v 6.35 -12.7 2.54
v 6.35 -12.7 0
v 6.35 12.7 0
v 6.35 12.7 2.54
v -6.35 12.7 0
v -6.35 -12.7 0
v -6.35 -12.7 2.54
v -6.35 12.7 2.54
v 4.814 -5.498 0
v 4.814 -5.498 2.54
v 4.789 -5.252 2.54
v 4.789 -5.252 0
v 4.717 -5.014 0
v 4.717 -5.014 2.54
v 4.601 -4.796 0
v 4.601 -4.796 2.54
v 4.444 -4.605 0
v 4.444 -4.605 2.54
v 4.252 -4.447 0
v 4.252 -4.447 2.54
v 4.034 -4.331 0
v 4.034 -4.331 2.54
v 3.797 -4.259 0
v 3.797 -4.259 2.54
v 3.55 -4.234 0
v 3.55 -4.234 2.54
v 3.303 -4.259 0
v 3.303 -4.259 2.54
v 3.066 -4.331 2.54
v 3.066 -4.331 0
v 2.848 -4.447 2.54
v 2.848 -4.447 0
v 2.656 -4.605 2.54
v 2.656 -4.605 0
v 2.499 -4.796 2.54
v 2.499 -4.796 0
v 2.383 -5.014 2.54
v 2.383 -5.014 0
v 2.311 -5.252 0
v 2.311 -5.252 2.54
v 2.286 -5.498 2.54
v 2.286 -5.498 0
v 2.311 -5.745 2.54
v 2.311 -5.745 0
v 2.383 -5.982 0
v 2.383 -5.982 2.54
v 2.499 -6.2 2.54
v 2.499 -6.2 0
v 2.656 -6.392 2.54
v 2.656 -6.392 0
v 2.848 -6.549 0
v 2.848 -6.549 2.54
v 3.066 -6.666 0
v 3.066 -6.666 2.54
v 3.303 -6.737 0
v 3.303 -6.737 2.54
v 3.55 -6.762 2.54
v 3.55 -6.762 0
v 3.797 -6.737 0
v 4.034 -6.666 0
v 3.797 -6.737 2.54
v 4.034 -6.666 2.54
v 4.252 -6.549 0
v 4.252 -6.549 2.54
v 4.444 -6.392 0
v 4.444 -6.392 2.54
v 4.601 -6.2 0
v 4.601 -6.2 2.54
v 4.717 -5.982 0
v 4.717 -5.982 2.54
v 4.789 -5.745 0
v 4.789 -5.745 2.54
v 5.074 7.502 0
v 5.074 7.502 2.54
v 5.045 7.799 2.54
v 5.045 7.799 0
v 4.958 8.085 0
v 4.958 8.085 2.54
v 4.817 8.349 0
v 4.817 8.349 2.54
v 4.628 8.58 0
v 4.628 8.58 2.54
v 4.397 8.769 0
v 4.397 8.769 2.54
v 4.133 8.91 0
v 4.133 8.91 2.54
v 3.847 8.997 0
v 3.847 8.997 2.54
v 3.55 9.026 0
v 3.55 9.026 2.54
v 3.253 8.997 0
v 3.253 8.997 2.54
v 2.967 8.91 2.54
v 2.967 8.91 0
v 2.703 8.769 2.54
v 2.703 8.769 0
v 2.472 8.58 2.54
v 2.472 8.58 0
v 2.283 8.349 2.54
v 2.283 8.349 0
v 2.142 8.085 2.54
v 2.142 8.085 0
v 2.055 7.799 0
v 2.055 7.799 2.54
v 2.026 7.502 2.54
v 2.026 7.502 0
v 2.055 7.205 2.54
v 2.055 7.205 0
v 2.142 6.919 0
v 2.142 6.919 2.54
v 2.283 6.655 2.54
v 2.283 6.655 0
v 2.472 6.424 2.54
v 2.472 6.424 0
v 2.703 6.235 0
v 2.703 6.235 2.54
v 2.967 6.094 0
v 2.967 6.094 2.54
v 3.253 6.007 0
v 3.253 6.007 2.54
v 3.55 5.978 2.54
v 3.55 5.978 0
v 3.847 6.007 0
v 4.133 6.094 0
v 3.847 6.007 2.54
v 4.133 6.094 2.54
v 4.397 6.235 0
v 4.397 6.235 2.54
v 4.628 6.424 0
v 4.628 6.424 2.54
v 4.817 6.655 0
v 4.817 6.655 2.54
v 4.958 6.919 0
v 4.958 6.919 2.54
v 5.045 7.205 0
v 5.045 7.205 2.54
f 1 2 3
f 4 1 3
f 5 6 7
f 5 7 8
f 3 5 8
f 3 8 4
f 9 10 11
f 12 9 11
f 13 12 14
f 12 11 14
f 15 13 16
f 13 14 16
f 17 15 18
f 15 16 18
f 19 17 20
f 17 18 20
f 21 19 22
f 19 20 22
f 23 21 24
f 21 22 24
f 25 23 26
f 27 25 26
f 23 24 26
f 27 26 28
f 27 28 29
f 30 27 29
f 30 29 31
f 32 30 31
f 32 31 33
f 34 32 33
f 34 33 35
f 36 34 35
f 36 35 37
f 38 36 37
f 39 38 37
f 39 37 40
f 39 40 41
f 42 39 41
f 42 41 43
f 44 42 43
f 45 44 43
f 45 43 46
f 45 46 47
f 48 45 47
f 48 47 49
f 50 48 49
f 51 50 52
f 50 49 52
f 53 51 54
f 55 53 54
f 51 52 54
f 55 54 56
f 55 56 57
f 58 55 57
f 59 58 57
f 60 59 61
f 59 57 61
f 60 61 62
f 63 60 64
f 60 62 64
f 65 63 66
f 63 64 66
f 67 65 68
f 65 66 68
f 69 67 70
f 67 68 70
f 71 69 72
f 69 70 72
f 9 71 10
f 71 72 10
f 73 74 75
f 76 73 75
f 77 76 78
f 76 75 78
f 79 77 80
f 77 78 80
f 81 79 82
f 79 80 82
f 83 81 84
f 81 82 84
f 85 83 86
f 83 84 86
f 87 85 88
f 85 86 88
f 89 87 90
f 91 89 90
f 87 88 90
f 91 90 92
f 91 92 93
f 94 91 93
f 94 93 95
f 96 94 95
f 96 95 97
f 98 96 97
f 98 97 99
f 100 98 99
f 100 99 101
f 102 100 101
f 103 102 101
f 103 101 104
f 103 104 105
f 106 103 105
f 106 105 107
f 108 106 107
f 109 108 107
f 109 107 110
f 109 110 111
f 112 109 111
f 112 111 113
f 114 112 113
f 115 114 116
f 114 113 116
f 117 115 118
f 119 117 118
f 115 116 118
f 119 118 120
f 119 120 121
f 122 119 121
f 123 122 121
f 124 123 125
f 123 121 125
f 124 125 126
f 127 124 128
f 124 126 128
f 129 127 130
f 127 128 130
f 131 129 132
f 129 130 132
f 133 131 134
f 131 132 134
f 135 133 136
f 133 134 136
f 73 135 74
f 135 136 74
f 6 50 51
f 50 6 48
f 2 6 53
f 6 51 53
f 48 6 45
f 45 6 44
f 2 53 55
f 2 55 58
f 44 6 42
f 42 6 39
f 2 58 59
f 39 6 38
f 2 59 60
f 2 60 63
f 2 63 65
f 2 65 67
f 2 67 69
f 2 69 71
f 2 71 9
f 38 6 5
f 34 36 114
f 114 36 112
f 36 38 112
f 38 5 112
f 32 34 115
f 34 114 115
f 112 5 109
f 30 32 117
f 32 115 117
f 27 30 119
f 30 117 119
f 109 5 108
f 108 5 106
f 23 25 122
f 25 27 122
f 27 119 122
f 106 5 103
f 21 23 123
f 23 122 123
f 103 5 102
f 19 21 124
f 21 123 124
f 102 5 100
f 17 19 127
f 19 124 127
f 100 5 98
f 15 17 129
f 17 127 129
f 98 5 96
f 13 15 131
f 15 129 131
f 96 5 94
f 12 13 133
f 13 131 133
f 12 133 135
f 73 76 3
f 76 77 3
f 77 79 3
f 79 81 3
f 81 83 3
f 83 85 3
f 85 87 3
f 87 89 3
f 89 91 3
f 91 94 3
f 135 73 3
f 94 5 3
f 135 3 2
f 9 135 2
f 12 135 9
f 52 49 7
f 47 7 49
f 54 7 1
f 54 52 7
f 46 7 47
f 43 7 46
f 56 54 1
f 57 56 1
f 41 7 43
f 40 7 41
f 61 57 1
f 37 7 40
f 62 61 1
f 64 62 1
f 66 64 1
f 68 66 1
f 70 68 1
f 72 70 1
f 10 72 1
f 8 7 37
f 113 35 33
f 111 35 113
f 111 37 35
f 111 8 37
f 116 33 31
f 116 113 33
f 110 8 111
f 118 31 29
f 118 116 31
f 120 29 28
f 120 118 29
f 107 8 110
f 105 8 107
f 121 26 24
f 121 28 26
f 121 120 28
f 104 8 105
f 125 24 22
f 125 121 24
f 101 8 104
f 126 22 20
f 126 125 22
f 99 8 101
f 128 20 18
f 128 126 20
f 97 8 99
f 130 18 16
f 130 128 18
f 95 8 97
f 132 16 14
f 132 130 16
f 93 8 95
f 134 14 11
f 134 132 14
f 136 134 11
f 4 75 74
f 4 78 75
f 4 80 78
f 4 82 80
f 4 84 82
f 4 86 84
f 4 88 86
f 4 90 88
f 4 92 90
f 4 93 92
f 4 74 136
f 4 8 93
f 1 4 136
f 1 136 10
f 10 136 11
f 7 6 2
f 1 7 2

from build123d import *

# Parameters (mm, degrees)
SKETCH1_W           = 12.7
SKETCH1_H           = 25.4
BOSS_EXTRUDE1_DEPTH = 2.54
CUT_EXTRUDE1_REACH  = 16.424
SKETCH2_R           = 1.524
SKETCH2_R_2         = 1.26365


with BuildPart() as part:
    # Sketch1 → Boss-Extrude1 (new body)
    with BuildSketch(Plane.XY):
        Rectangle(SKETCH1_W, SKETCH1_H)
    extrude(amount=BOSS_EXTRUDE1_DEPTH)

    # Sketch2 → Cut-Extrude1 (cut, up to next)
    with BuildSketch(Plane.XY.offset(2.54), mode=Mode.PRIVATE) as cut_extrude1_sk1:
        with Locations((3.55, 7.501932673)):
            Circle(SKETCH2_R)
    cut_extrude1_tool1 = extrude(cut_extrude1_sk1.sketch, amount=-CUT_EXTRUDE1_REACH, mode=Mode.PRIVATE) & part.part
    # Sketch2 → Cut-Extrude1 (cut, up to next)
    with BuildSketch(Plane.XY.offset(2.54), mode=Mode.PRIVATE) as cut_extrude1_sk2:
        with Locations((3.55, -5.498067327)):
            Circle(SKETCH2_R_2)
    cut_extrude1_tool2 = extrude(cut_extrude1_sk2.sketch, amount=-CUT_EXTRUDE1_REACH, mode=Mode.PRIVATE) & part.part
    add(cut_extrude1_tool1.solids().sort_by_distance((3.55, 7.501933, 2.54))[0], mode=Mode.SUBTRACT)
    add(cut_extrude1_tool2.solids().sort_by_distance((3.55, -5.498067, 2.54))[0], mode=Mode.SUBTRACT)


solid = part.part
